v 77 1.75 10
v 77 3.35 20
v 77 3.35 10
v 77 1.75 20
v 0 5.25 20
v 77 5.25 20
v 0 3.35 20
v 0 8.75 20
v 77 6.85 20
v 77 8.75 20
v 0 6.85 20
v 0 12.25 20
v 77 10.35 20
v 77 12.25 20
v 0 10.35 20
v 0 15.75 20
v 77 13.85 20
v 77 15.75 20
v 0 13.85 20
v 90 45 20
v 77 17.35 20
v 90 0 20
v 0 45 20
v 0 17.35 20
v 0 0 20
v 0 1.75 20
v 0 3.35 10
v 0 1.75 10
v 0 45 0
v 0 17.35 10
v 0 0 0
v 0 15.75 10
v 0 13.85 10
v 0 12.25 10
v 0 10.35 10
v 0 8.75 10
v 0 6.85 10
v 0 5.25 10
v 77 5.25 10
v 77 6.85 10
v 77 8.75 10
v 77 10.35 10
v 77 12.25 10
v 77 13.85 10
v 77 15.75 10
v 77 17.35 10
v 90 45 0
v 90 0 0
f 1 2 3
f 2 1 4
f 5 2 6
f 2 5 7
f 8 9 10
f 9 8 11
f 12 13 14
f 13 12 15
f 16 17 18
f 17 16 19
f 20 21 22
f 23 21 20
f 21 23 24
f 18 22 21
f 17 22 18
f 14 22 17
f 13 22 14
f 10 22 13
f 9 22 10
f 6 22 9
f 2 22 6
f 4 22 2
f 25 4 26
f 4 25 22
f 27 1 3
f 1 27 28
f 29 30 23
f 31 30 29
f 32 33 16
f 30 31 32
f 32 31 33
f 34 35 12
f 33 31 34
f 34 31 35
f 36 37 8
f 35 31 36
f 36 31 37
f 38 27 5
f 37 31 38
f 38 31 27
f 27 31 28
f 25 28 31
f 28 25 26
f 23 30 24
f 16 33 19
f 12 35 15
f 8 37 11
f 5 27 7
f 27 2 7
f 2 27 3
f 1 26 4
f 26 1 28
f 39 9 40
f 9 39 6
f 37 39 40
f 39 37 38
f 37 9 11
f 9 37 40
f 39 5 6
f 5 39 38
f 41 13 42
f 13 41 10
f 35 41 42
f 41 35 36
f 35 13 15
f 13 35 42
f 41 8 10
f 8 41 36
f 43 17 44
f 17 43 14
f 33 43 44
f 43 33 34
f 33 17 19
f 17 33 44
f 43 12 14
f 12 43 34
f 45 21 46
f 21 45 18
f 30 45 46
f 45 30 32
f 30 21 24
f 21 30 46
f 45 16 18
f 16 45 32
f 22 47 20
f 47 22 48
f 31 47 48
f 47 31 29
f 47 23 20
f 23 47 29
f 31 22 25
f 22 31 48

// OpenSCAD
// Drying Rack for 10 Microscope Slides
// Base: 90 x 45 x 20 mm
// Slots: 10 parallel slots along X, 77mm long, 1.6mm wide, 10mm deep
// Spacing: 3.5 mm centre-to-centre (Y)

// Base Dimensions
$base_length = 90;
$base_width = 45;
$base_height = 20;

// Slide Dimensions (for verification)
$slide_length = 75;
$slide_width = 25;
$slide_thickness = 1;

// Slot Dimensions
$num_slots = 10;
$slot_length = 77;
$slot_width = 1.6;
$slot_depth = 10;
$slot_spacing = 3.5; // Centre-to-centre in Y

// Extrusion quality for curved corners (though slots are rectangular, good practice)
$fn = 64;

// Calculate slot positions
// Group is centred on the block in Y.
// Total width of slot group = (num_slots - 1) * spacing
// Offset from center to first slot center = (Total width / 2) - (slot_width / 2)
// Actually, simpler: Center of the first slot is at: -( (num_slots-1)*spacing / 2 ) + (spacing/2) ? 
// No, let's just calculate the offset of the first slot from the center of the block.
// The centers are at: -d, -d+s, -d+2s ... +d
// Where d is the distance from center to the first slot center.
// The span from first center to last center is (num_slots - 1) * spacing.
// The distance from the absolute center of the group to the first slot center is:
// offset = ( (num_slots - 1) * slot_spacing ) / 2 - (slot_spacing / 2) ? 
// Let's re-evaluate.
// Centers: y_0, y_1, ... y_9.
// y_0 = -y_max, y_9 = +y_max.
// y_9 - y_0 = 9 * 3.5 = 31.5.
// So y_max = 31.5 / 2 = 15.75.
// The centers are at -15.75, -12.25, ..., +15.75.
// This ensures the group is perfectly centered on the block (width 45).

$slot_center_offset = ( ($num_slots - 1) * $slot_spacing ) / 2;

// Build the base block
difference() {
    // Main Block
    cube([
        $base_length, 
        $base_width, 
        $base_height
    ]);

    // Cut Slots
    for (i = [0 : $num_slots - 1]) {
        // Calculate Y position for this slot
        $y_pos = -($slot_center_offset) + (i * $slot_spacing);
        
        // Slot geometry: 
        // Length along X: $slot_length
        // Width along Y: $slot_width
        // Depth along Z: $slot_depth
        // Position: X centered, Y at $y_pos, Z at top of block ($base_height - $slot_depth)
        
        translate([
            0, 
            $y_pos, 
            $base_height - $slot_depth
        ]) {
            cube([
                $slot_length, 
                $slot_width, 
                $slot_depth
            ]);
        }
    }
}
